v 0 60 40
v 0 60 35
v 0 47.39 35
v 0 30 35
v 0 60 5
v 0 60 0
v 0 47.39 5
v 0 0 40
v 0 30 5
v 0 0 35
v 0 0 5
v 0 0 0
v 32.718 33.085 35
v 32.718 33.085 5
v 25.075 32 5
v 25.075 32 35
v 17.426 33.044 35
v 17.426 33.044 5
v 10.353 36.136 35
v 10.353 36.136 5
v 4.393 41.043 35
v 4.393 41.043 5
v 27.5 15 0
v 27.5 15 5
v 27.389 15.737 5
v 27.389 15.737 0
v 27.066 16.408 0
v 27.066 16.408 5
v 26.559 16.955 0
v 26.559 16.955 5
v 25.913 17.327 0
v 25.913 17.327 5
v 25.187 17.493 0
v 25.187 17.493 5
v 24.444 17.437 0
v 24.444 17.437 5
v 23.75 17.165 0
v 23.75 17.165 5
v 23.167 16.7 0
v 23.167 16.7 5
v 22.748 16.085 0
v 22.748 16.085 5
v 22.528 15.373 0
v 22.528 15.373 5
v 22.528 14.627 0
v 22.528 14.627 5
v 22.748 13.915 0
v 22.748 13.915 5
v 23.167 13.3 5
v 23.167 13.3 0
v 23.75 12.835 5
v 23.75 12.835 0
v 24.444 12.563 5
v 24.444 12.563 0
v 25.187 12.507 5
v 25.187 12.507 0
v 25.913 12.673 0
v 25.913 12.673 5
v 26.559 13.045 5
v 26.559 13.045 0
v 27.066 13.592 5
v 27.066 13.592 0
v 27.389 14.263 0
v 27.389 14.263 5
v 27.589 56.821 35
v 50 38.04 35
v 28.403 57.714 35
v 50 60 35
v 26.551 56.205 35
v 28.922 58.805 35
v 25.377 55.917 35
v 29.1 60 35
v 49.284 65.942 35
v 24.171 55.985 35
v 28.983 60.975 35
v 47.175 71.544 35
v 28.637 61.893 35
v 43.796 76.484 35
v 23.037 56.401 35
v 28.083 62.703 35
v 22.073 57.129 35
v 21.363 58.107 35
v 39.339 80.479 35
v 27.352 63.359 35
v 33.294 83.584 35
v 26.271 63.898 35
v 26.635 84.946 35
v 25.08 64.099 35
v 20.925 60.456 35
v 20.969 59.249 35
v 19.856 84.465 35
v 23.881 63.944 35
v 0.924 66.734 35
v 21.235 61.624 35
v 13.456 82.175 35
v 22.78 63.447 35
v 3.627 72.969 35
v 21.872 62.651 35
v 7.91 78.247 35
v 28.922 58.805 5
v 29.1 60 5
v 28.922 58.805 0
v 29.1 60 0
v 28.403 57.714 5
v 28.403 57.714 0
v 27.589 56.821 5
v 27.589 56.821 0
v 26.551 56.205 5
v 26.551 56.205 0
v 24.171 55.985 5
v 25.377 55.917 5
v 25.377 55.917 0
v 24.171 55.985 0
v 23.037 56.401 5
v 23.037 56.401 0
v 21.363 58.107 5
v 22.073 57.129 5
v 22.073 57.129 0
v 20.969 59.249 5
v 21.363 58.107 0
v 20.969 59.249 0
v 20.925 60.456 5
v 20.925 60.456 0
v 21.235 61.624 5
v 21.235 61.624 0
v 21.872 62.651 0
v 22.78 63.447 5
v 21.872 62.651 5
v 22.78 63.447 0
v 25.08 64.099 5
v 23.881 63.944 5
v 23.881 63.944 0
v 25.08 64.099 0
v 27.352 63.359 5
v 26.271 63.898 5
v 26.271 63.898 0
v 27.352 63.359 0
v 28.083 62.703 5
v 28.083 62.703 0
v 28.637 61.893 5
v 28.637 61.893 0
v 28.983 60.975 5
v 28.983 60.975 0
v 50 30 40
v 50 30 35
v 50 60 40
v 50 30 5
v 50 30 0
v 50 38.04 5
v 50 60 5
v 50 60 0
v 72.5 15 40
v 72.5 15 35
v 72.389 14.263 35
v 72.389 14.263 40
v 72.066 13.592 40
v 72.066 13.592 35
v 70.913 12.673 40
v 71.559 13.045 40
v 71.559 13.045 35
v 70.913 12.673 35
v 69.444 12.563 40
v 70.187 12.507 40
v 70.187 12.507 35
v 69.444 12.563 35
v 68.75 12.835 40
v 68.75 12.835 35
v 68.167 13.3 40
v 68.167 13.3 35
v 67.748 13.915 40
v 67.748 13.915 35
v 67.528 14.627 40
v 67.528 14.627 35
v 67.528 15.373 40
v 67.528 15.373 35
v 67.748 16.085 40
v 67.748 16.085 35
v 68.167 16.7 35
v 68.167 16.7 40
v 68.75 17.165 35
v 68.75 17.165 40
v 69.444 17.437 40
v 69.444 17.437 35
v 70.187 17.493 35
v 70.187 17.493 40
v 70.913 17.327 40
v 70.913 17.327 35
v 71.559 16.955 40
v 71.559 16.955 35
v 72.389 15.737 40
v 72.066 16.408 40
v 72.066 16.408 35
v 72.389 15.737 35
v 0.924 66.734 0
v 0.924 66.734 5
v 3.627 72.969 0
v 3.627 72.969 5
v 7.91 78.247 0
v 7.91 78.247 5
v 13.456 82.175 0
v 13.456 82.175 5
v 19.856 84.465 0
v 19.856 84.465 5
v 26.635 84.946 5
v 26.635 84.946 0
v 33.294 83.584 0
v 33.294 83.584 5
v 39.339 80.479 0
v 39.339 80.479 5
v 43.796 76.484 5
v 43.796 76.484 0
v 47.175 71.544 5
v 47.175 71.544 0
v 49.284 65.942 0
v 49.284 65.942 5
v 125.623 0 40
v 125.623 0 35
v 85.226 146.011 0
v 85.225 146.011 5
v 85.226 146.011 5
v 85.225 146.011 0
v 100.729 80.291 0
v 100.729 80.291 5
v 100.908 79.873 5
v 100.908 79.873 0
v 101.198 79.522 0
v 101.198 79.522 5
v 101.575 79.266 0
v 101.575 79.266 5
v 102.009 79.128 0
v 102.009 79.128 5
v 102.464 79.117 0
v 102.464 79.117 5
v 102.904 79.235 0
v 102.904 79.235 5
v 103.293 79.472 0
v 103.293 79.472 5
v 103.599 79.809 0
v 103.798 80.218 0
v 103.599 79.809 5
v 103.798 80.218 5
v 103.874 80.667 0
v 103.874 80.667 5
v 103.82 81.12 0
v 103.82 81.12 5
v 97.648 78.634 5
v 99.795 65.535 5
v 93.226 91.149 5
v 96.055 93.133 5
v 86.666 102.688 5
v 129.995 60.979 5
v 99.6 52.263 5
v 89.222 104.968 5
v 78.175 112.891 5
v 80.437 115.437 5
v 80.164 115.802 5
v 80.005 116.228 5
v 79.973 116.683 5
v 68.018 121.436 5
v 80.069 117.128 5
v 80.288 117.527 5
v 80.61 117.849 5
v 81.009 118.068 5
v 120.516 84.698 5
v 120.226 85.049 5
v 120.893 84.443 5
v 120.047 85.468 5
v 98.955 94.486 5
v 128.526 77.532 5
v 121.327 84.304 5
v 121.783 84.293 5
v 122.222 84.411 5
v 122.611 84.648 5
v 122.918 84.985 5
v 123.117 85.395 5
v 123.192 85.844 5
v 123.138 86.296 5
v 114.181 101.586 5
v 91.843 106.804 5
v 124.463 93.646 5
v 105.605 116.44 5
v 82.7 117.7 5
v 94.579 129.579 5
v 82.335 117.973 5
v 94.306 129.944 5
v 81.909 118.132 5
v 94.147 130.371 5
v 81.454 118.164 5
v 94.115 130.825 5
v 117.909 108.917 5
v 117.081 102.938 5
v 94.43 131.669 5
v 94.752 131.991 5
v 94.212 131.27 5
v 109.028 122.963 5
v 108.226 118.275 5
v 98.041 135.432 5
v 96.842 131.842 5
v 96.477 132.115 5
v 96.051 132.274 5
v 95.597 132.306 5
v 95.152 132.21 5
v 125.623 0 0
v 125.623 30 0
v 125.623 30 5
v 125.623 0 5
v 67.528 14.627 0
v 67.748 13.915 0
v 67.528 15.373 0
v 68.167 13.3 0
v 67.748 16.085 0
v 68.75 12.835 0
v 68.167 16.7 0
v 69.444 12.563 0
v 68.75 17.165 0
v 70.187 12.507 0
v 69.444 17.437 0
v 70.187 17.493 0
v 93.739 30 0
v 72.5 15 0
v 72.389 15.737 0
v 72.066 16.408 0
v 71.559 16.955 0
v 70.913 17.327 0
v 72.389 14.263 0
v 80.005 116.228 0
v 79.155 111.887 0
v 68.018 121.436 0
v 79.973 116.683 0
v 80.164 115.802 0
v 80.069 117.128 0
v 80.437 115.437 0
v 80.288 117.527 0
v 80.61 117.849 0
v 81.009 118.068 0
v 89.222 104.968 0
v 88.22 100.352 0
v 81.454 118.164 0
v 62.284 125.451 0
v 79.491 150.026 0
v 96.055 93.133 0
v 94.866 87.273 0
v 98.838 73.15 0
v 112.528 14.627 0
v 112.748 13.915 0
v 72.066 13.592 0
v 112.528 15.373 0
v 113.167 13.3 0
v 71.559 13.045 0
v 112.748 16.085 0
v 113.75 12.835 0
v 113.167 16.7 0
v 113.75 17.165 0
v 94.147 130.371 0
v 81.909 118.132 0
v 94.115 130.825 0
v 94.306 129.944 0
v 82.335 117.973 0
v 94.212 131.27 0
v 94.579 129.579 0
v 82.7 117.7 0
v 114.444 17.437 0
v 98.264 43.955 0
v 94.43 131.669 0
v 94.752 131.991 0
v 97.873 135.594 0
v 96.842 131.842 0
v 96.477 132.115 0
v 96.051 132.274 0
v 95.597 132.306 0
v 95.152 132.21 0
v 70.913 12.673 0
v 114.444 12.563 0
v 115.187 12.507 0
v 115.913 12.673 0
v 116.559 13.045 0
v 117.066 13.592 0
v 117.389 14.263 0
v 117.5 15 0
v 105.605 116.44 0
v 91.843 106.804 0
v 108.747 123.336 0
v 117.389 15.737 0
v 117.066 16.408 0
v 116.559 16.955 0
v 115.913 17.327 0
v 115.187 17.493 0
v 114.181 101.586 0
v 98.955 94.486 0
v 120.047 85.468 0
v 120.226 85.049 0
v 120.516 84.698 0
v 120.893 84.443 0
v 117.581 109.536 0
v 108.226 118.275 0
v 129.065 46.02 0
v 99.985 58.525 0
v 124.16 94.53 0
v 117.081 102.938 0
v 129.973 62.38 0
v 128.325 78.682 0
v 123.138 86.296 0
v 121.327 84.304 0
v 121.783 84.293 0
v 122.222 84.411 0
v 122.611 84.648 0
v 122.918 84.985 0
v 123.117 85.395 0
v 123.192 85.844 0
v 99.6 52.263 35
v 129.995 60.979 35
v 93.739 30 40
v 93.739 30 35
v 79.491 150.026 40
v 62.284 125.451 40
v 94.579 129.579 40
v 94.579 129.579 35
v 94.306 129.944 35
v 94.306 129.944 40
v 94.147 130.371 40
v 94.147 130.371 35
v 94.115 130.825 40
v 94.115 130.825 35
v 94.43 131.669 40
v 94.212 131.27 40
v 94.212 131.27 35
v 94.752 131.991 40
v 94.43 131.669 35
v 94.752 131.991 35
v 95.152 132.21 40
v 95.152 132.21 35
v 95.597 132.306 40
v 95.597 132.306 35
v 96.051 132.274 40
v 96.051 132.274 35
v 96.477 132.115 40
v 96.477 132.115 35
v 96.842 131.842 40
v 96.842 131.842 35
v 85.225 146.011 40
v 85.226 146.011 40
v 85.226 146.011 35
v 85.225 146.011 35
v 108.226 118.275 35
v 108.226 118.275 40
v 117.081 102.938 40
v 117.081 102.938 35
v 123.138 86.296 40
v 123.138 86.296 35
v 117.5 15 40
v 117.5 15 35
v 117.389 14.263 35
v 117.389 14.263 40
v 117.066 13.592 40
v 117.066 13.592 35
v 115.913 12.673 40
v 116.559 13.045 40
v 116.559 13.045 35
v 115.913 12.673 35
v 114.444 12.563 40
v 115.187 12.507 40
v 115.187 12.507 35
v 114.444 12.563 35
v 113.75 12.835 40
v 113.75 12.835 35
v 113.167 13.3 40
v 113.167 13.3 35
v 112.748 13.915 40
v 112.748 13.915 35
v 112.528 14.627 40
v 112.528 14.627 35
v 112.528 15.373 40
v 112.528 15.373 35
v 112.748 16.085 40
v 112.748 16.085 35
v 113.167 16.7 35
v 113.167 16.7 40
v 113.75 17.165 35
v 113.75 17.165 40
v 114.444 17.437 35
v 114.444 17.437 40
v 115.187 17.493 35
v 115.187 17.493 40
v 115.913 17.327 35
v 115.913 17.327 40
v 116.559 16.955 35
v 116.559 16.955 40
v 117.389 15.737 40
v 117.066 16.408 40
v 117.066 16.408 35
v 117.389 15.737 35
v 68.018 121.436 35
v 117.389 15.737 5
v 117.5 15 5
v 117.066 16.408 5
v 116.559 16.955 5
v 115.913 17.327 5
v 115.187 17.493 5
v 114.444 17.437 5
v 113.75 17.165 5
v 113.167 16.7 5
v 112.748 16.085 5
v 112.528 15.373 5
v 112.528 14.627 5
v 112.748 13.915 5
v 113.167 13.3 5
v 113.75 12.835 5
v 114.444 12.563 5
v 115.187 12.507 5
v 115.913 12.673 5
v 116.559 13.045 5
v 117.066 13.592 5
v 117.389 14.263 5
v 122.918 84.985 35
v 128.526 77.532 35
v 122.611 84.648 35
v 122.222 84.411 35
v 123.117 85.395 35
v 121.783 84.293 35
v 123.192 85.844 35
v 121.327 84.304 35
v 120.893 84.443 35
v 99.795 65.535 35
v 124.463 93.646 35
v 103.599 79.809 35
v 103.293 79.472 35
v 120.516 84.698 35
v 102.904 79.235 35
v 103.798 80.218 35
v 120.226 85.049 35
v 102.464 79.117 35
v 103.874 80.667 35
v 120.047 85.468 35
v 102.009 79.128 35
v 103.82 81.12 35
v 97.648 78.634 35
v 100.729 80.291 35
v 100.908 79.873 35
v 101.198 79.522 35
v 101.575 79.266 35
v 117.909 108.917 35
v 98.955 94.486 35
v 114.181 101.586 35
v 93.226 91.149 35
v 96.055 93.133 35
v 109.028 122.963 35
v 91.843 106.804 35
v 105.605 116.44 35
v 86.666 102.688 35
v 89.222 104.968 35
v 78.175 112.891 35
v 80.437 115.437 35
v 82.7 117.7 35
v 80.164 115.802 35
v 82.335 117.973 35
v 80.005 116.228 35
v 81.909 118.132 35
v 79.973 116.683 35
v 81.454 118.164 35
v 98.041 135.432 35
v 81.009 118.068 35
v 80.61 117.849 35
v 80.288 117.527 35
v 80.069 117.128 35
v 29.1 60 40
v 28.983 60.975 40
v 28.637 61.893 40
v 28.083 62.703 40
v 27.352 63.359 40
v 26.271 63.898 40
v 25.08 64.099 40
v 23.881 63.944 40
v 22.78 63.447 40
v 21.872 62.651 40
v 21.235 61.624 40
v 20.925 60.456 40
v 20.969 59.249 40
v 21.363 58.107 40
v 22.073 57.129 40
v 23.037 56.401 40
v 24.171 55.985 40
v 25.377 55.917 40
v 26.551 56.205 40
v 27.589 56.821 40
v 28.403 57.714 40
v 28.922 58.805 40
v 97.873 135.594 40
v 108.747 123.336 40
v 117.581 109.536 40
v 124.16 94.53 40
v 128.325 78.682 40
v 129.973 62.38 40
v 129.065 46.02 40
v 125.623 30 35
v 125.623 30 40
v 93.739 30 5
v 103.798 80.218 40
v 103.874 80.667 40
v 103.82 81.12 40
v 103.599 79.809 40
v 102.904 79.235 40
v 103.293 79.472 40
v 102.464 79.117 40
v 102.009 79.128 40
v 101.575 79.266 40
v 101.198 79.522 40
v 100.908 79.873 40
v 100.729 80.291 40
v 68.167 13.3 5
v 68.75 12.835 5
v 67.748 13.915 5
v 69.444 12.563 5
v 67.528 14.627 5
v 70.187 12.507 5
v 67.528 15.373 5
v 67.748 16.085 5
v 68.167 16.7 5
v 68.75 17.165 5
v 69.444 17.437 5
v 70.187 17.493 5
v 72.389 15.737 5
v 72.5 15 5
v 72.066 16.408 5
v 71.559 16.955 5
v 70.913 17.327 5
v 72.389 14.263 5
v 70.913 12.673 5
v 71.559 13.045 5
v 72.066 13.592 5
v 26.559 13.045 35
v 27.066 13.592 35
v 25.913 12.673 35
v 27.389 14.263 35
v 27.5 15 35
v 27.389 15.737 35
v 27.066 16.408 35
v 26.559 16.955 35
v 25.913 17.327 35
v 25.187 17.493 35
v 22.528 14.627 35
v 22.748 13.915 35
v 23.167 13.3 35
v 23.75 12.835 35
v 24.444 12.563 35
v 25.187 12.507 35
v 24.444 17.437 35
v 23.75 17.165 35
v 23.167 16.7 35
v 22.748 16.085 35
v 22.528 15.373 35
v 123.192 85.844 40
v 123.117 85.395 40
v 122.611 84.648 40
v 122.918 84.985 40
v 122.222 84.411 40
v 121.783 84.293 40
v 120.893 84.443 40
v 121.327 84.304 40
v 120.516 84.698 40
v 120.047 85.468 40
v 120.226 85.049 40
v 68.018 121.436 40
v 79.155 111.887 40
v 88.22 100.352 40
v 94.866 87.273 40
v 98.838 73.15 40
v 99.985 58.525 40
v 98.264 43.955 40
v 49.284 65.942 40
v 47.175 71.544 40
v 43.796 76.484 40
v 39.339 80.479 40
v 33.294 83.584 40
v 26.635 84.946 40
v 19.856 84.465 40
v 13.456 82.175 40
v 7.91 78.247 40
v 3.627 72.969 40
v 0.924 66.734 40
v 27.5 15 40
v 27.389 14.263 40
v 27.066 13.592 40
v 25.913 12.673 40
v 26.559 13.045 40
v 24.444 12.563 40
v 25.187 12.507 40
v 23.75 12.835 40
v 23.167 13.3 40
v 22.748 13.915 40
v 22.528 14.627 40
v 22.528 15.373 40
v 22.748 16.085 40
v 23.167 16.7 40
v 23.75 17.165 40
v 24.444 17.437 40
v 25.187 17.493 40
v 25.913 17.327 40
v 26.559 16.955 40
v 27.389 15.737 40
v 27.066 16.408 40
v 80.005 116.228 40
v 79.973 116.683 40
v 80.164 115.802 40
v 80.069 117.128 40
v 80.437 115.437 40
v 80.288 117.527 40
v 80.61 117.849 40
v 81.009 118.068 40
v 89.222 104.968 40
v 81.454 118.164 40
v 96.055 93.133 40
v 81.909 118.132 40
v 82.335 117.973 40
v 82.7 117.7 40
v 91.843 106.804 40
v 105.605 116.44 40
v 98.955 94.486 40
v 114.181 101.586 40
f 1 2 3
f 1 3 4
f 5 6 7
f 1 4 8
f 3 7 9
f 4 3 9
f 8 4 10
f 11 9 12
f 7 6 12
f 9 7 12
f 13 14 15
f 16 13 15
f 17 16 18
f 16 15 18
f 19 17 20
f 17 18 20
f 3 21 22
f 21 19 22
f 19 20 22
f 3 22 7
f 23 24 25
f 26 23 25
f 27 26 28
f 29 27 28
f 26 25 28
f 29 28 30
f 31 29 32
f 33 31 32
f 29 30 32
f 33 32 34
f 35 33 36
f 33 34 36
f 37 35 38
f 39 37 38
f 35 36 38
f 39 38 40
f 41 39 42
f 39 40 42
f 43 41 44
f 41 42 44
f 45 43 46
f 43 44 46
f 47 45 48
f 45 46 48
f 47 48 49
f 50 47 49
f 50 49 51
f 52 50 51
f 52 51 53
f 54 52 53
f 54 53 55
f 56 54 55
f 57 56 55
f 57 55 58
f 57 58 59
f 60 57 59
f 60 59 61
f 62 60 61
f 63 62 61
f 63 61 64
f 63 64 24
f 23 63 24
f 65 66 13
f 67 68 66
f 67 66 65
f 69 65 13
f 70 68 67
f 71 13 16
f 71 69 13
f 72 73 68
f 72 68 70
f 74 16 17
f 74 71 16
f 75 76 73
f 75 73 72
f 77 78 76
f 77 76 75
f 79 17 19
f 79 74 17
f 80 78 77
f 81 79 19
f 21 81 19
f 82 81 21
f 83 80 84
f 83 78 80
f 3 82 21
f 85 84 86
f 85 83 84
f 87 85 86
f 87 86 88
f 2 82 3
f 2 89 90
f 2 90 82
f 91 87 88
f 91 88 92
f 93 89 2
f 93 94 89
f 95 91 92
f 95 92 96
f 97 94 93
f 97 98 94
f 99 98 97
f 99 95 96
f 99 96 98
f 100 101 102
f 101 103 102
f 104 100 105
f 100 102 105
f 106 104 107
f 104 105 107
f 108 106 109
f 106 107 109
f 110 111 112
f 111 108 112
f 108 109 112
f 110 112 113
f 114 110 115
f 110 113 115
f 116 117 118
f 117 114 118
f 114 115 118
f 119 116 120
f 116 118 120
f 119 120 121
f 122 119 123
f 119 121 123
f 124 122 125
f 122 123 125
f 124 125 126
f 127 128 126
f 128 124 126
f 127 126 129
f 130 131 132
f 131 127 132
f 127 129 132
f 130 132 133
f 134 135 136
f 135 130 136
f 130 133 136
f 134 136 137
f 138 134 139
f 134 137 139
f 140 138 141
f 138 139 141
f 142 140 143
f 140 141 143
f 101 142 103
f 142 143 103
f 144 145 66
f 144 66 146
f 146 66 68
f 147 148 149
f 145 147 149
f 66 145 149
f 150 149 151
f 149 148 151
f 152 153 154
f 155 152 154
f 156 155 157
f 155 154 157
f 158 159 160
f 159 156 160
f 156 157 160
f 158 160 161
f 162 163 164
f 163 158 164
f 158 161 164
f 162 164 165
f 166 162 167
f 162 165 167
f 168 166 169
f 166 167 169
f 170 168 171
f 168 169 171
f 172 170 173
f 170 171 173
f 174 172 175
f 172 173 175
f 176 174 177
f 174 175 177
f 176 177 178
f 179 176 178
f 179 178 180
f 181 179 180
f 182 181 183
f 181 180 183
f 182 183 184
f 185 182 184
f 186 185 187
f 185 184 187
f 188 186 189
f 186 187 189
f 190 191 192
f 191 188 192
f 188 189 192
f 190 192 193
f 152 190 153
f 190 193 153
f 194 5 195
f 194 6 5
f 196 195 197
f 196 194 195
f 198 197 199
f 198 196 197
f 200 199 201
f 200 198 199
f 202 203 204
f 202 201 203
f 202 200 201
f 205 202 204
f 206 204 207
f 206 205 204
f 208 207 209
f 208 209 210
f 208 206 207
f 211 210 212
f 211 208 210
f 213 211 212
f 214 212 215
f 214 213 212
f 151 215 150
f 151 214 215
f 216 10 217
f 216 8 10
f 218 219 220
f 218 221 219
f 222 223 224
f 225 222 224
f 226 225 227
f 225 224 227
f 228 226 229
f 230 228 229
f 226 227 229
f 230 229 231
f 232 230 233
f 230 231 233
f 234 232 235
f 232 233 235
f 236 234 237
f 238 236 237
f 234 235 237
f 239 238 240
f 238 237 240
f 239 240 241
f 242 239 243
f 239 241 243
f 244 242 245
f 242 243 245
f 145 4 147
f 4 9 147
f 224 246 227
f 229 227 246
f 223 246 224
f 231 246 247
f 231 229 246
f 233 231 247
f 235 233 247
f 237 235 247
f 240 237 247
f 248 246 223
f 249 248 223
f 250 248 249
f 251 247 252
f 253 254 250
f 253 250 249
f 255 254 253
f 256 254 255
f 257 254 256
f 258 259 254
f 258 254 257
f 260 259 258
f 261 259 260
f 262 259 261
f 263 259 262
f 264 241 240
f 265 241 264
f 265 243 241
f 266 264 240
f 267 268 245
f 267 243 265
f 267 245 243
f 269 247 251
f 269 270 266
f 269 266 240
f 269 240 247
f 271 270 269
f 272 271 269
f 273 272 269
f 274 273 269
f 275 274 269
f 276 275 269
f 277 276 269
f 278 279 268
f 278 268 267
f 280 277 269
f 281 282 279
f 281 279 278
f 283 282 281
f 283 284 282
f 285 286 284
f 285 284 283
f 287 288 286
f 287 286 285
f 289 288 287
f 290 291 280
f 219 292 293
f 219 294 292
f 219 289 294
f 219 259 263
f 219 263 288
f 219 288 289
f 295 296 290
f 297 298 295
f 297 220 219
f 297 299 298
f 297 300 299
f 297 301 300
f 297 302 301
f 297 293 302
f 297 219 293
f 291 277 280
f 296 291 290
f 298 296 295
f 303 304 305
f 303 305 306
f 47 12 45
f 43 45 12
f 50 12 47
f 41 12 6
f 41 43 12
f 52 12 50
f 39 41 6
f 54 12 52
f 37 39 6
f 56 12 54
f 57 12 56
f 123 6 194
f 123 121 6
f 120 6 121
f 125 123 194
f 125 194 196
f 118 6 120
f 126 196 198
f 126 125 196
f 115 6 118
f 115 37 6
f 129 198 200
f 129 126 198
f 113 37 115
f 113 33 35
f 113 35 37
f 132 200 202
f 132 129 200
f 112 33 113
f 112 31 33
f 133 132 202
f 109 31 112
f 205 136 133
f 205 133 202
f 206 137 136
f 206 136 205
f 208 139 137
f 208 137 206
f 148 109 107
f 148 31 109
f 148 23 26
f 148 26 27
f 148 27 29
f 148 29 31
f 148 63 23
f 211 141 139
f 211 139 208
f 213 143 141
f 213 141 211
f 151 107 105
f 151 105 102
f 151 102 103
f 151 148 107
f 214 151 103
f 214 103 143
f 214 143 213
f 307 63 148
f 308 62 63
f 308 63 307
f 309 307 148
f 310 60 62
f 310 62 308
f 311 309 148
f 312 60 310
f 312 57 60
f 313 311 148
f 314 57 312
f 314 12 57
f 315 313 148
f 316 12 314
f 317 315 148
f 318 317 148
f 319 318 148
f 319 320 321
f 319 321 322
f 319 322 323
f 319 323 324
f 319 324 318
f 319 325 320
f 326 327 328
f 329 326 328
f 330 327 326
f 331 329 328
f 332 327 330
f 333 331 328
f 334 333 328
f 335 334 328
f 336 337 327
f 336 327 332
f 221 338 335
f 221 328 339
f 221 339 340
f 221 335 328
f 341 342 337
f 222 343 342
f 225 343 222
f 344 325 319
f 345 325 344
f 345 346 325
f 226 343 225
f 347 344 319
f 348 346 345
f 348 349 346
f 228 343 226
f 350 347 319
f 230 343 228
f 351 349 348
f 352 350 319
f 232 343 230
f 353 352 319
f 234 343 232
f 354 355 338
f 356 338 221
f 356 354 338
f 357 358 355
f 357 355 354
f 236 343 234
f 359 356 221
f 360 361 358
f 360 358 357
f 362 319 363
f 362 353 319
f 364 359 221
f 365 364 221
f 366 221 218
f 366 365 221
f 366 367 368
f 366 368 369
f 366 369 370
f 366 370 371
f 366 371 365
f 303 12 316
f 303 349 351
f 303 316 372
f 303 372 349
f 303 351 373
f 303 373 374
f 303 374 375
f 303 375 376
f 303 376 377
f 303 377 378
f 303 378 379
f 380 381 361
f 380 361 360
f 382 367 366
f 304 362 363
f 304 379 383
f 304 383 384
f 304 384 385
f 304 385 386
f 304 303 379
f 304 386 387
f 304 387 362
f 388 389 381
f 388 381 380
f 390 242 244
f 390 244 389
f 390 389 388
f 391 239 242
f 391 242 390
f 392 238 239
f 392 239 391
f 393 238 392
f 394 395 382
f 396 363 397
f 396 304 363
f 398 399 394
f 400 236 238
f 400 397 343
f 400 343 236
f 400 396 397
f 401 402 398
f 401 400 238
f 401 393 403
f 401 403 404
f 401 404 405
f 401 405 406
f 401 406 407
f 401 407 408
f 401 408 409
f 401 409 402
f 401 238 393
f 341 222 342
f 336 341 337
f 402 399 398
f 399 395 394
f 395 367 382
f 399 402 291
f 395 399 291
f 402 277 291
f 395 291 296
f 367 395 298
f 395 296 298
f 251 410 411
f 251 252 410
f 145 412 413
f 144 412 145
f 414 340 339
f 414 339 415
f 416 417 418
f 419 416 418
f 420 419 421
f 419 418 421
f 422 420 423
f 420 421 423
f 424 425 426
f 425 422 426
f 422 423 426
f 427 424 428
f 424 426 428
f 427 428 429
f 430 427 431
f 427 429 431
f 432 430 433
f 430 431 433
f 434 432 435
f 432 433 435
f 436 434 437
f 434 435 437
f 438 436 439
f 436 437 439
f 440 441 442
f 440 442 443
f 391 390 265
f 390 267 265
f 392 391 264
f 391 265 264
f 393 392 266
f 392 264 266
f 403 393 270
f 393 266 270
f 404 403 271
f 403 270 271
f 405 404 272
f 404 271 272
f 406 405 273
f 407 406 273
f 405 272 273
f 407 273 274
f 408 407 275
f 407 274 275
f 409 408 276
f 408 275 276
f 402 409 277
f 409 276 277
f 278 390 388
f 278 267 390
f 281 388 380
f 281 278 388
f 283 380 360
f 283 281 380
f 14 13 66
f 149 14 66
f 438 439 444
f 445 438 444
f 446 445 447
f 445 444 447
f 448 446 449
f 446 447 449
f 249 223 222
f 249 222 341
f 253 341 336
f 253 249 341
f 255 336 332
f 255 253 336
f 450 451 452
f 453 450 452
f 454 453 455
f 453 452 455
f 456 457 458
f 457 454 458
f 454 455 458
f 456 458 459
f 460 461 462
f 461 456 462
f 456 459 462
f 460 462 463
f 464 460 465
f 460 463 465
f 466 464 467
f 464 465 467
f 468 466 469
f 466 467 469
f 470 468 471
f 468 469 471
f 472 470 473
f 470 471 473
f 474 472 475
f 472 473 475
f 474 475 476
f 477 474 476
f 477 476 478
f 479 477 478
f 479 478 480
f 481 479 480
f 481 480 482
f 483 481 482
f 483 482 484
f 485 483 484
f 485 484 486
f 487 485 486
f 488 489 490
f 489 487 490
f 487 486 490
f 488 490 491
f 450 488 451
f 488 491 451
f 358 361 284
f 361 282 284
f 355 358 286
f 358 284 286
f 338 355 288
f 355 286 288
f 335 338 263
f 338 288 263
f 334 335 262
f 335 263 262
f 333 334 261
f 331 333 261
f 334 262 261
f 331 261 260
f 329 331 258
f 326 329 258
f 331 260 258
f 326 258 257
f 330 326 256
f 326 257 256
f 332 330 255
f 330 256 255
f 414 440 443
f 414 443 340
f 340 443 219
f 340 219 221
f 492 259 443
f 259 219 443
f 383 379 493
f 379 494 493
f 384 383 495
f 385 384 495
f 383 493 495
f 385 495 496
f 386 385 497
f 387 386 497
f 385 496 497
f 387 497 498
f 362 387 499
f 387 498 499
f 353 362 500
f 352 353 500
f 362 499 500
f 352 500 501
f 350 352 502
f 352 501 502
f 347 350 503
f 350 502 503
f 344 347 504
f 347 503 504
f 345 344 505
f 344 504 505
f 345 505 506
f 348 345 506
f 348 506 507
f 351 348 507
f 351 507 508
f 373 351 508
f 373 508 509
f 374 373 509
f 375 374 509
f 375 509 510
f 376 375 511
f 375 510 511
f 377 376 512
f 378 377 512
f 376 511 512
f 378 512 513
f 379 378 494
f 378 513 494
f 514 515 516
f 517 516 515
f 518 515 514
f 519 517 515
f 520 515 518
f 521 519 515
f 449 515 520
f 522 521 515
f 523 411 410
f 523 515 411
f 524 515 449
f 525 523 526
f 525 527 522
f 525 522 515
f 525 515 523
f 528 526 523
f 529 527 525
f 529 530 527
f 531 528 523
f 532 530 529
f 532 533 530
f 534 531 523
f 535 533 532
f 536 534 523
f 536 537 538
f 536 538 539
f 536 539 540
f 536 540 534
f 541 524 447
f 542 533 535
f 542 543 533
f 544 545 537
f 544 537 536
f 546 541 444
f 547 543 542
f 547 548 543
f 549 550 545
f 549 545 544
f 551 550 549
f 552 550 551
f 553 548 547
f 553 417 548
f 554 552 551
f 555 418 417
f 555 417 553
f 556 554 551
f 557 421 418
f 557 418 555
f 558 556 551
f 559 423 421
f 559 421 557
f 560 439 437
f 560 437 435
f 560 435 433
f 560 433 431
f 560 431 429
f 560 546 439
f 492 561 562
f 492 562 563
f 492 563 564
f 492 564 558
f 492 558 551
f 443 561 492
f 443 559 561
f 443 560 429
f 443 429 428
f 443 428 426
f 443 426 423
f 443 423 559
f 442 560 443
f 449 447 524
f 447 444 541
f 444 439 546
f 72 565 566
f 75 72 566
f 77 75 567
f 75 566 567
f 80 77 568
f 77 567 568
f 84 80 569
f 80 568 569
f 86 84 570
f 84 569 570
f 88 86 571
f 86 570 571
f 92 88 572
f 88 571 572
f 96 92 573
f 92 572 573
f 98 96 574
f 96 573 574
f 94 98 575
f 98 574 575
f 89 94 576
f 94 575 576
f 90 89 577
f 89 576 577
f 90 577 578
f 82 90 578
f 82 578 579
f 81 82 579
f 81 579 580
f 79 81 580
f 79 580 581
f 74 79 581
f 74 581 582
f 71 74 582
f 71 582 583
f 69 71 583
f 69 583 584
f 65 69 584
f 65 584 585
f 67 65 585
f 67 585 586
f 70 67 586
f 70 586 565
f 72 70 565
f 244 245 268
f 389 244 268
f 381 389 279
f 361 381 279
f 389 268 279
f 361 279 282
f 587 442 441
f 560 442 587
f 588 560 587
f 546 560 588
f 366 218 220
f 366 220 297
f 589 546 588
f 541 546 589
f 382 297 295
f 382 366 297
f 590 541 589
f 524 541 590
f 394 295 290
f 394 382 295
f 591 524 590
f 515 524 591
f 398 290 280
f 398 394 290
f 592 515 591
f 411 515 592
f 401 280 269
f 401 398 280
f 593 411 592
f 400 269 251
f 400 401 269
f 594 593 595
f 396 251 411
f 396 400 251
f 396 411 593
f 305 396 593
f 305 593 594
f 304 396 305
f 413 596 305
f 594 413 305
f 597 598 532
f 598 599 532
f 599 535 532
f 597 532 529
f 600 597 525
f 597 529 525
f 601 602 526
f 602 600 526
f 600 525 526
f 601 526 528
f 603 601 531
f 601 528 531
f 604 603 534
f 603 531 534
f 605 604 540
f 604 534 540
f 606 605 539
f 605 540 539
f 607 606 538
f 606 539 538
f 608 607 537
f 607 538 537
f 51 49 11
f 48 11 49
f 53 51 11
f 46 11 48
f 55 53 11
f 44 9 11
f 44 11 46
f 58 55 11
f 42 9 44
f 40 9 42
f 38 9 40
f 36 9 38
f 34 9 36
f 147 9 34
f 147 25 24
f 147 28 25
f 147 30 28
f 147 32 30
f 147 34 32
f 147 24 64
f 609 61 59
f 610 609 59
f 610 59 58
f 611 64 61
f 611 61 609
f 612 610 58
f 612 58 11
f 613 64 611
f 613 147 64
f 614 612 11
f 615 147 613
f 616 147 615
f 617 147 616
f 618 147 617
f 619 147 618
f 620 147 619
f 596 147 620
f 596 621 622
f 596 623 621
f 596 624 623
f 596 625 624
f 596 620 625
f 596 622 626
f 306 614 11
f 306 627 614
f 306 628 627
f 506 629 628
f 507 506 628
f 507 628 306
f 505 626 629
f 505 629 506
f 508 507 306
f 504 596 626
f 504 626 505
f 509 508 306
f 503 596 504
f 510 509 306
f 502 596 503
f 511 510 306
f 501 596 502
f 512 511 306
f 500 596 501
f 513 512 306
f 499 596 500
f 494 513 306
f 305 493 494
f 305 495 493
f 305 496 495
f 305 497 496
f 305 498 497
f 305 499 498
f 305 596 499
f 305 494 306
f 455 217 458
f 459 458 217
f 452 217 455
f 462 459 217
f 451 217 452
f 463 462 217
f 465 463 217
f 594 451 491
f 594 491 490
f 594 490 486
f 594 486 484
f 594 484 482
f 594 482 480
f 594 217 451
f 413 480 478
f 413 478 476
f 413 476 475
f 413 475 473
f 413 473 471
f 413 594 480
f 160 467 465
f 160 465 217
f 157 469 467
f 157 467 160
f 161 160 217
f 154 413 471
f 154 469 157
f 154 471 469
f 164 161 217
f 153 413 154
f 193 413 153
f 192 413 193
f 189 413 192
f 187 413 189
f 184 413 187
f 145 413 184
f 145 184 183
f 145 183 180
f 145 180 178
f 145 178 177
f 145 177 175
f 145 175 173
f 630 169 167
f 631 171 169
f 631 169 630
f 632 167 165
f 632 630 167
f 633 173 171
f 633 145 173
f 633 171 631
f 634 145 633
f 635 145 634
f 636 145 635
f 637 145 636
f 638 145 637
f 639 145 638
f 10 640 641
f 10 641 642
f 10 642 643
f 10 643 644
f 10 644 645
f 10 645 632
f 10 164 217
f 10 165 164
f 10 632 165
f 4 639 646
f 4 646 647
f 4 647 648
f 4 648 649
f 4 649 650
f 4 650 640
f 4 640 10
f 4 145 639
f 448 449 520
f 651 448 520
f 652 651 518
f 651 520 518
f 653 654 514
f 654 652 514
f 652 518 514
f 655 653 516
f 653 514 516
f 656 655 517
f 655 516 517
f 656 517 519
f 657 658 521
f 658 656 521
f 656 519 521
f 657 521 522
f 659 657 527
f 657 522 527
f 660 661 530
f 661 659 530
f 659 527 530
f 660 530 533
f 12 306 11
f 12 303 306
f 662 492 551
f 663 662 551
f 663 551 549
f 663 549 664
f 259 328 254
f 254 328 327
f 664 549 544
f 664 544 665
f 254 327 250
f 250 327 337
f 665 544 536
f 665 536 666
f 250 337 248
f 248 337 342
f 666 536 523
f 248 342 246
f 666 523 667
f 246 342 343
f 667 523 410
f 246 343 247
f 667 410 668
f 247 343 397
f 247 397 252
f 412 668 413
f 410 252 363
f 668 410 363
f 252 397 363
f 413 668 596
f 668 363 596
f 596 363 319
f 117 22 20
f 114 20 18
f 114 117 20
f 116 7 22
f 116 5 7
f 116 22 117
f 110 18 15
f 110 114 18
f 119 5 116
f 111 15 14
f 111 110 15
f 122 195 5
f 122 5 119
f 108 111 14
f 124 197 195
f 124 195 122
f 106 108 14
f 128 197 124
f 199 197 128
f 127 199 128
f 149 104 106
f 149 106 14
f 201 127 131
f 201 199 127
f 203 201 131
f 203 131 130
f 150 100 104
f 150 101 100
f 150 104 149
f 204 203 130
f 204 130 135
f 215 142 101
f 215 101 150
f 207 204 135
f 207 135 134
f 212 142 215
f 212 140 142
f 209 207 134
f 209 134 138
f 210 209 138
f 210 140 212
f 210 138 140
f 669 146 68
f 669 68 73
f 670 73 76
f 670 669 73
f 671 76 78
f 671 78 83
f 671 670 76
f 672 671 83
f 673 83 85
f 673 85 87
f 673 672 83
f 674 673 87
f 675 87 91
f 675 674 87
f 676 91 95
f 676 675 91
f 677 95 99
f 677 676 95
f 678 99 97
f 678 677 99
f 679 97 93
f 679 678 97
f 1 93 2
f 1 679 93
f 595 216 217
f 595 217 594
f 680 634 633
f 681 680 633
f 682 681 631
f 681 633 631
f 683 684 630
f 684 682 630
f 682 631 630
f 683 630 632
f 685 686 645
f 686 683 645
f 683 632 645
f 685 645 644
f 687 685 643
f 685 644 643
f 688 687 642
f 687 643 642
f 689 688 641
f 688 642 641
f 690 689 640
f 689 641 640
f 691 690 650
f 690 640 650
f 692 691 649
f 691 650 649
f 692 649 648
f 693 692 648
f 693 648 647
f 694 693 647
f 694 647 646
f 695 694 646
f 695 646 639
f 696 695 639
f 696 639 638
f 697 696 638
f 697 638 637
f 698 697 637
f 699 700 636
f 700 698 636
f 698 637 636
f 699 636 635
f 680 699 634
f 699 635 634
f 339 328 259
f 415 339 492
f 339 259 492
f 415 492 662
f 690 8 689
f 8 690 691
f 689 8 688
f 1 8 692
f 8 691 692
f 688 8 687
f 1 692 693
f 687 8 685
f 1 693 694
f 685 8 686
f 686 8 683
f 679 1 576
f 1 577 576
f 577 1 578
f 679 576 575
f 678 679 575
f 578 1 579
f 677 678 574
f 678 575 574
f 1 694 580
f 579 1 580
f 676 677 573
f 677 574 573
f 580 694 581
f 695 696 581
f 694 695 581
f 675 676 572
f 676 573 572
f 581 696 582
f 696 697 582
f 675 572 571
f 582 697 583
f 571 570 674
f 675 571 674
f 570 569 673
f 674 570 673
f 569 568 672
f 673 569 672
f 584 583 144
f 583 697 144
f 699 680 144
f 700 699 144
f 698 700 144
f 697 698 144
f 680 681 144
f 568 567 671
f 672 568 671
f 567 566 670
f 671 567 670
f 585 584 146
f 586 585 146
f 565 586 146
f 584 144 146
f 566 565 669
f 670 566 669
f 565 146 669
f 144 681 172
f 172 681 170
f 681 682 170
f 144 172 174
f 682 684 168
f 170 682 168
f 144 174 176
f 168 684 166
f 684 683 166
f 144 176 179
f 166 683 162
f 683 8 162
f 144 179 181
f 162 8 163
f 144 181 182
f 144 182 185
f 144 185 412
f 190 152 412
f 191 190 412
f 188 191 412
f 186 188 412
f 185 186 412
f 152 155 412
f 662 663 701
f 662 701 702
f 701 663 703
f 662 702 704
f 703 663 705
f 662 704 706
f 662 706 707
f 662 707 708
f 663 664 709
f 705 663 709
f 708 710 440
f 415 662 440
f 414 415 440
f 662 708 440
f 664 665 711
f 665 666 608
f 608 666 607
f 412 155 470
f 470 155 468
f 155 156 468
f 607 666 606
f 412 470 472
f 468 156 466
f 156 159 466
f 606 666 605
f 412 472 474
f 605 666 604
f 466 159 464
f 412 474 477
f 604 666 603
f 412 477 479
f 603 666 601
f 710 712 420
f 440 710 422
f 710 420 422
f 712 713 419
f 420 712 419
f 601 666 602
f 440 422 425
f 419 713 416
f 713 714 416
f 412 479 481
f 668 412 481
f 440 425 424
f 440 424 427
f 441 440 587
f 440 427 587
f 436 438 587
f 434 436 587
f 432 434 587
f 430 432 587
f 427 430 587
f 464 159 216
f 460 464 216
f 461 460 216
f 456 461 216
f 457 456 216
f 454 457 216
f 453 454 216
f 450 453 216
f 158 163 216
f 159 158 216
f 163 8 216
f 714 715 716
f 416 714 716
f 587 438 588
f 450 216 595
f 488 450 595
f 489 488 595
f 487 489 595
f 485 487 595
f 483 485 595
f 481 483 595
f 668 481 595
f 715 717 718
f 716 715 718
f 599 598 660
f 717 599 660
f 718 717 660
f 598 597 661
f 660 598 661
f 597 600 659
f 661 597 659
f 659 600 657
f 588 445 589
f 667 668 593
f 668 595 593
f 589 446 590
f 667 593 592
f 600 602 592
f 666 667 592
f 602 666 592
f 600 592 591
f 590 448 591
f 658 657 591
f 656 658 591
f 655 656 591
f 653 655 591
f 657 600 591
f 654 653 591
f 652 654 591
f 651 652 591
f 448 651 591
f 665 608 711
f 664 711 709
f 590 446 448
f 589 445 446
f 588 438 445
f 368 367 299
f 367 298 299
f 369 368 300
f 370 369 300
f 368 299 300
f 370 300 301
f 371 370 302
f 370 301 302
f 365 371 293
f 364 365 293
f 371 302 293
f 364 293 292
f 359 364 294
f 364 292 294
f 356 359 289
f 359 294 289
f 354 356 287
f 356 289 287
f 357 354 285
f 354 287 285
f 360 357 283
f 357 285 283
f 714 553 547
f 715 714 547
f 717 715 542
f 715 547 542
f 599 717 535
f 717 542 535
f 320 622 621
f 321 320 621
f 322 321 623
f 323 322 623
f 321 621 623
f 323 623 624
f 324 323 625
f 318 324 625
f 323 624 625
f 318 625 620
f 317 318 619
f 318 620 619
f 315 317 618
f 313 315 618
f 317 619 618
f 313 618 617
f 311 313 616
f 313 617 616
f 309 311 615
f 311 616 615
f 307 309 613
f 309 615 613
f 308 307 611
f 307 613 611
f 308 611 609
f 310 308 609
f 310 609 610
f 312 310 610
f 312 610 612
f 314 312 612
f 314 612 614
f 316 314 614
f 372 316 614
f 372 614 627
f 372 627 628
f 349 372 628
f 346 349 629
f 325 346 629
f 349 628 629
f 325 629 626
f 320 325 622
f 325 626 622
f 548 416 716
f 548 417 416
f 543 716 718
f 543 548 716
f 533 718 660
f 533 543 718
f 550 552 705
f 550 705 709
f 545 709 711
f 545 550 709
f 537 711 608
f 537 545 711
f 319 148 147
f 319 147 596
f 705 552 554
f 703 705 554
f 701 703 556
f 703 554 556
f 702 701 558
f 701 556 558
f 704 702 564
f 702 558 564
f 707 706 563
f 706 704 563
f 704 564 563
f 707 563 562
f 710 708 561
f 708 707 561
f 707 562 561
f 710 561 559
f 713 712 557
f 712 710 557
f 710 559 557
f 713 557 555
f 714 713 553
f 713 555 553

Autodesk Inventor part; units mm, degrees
ref_plane "YZ Plane" through (0, 0, 0) normal (1, 0, 0) x (0, 1, 0)
ref_plane "XZ Plane" through (0, 0, 0) normal (0, 1, 0) x (-1, 0, 0)
ref_plane "XY Plane" through (0, 0, 0) normal (0, 0, 1) x (1, 0, 0)
sketch "Sketch1" plane through (0, 0, 0) normal (0, 0, 1) x (1, 0, 0)
  line L0 (0, 0) -> (0, 60)
  arc A0 (50, 60) -> (0, 60) centre (25, 60) ccw
  line L1 (50, 60) -> (50, 30)
  line L2 (50, 30) -> (93.7386, 30)
  line L3 (125.6231, 30) -> (125.6231, 0)
  line L4 (125.6231, 0) -> (0, 0)
  circle A1 centre (25, 60) radius 4.1
  arc A2 (93.7386, 30) -> (68.0182, 121.4364) centre (25, 60) ccw
  arc A3 (125.6231, 30) -> (85.2255, 146.011) centre (25, 60) ccw
  line L5 (68.0182, 121.4364) -> (85.2255, 146.011)
  line L6 (68.0182, 121.4364) -> (25, 60)
  dimension "d0" = 30
  dimension "d1" = 50
  dimension "d2" = 8.2
  dimension "d3" = 30
  dimension "d30" = 55
  dimension "d32" = 30
  dimension "d33" = 75
  dimension "d34" = 105
extrude "Extrusion1" add sketch "Sketch1" along normal blind 5 contours L0 A0 L1 L2 A2 L5 A3 L3 L4
sketch "Sketch2" plane through (0, 0, 5) normal (0, 0, 1) x (1, 0, 0)
  circle A0 centre (25, 15) radius 2.5
  line L0 (0, 0) -> (125.6231, 0) projected
  line L1 (0, 60) -> (0, 0) projected
  dimension "d18" = 15
  dimension "d19" = 25
  dimension "d20" = 5
extrude "Extrusion2" cut sketch "Sketch2" against normal blind 10
pattern_linear "Rectangular Pattern1" count 3 spacing 45 along (1, 0, 0) of "Extrusion2"
sketch "Sketch4" plane through (0, 0, 5) normal (0, 0, 1) x (1, 0, 0)
  circle A0 centre (25, 60) radius 4.1 projected
  line L0 (0, 60) -> (0, 0) projected
  arc A1 (0, 47.3905) -> (32.7178, 33.0847) centre (25, 60) ccw
  line L1 (32.7178, 33.0847) -> (50, 38.0403)
  line L2 (50, 30) -> (50, 60) projected
  line L3 (0, 47.3905) -> (0, 30)
  line L4 (93.7386, 30) -> (50, 30) projected
  line L5 (0, 30) -> (50, 30)
  line L6 (50, 30) -> (50, 38.0403)
  dimension "d26" = 28
  dimension "d27" = 16
extrude "Extrusion3" add sketch "Sketch4" along normal blind 15 contours A1 L1 L2 L5 L0
sketch "Sketch5" plane through (0, 0, 5) normal (0, 0, 1) x (1, 0, 0)
  circle A0 centre (25, 60) radius 4.1 projected
  arc A1 (100.7286, 80.2914) -> (80.4372, 115.4372) centre (25, 60) ccw
  arc A2 (103.8195, 81.1196) -> (82.6999, 117.6999) centre (25, 60) ccw
  arc A3 (120.0471, 85.4678) -> (94.5793, 129.5793) centre (25, 60) ccw
  arc A4 (123.1381, 86.296) -> (96.842, 131.842) centre (25, 60) ccw
  arc A5 (82.6999, 117.6999) -> (80.4372, 115.4372) centre (81.5685, 116.5685) ccw
  arc A6 (100.7286, 80.2914) -> (103.8195, 81.1196) centre (102.2741, 80.7055) ccw
  arc A7 (96.842, 131.842) -> (94.5793, 129.5793) centre (95.7107, 130.7107) ccw
  arc A8 (120.0471, 85.4678) -> (123.1381, 86.296) centre (121.5926, 85.8819) ccw
  line L0 (95.7107, 130.7107) -> (81.5685, 116.5685)
  line L1 (81.5685, 116.5685) -> (25, 60)
  line L2 (25, 60) -> (102.2741, 80.7055)
  line L3 (102.2741, 80.7055) -> (121.5926, 85.8819)
  line L4 (93.7386, 30) -> (50, 30) projected
  point P0 (0, 0)
  dimension "d35" = 3.2
  dimension "d36" = 3.2
  dimension "d37" = 45
  dimension "d38" = 15
  dimension "d44" = 80
  dimension "d45" = 20
extrude "Extrusion4" cut sketch "Sketch5" against normal blind 15 contours L2 L3 A6 | A1 L1 L0 A2 L3 L2 | A5 L0 L1 | A3 A7 A4 A8
sketch "Sketch6" plane through (0, 0, 5) normal (0, 0, 1) x (1, 0, 0)
  circle A0 centre (25, 60) radius 4.1 projected
  arc A1 (125.6231, 30) -> (85.2255, 146.011) centre (25, 60) ccw projected
  arc A2 (125.6231, 30) -> (129.9954, 60.9786) centre (25, 60) ccw
  arc A3 (93.7386, 30) -> (68.0182, 121.4364) centre (25, 60) ccw projected
  arc A4 (93.7386, 30) -> (99.5998, 52.2628) centre (25, 60) ccw
  line L0 (99.5998, 52.2628) -> (129.9954, 60.9786)
  line L1 (93.7386, 30) -> (125.6231, 30)
  line L2 (50, 38.0403) -> (32.7178, 33.0847) projected
  point P0 (0, 0)
extrude "Extrusion5" add sketch "Sketch6" along normal blind 15 contours L1 A3 L0 A1
mirror "Mirror1" about plane through (111.8693, 45.4893, 20) normal (0, 0, 1)
sketch "Sketch7" plane through (68.0182, 121.4364, 0) normal (-0.8192, 0.5736, 0) x (0, 0, 1)
  line L0 (0, -41.8595) -> (0, 30) projected
  line L1 (40, 30) -> (35, 30) projected
  line L2 (0, 0) -> (40, 0)
  line L3 (40, 0) -> (40, 30)
  line L4 (40, 30) -> (0, 30)
  line L5 (0, 30) -> (0, 0)
  point P0 (0, -138.4885)
  point P1 (35, 30)
  point P2 (0, 30)
extrude "Extrusion6" add sketch "Sketch7" along normal blind 7
properties part number "force_measurement_plate"
